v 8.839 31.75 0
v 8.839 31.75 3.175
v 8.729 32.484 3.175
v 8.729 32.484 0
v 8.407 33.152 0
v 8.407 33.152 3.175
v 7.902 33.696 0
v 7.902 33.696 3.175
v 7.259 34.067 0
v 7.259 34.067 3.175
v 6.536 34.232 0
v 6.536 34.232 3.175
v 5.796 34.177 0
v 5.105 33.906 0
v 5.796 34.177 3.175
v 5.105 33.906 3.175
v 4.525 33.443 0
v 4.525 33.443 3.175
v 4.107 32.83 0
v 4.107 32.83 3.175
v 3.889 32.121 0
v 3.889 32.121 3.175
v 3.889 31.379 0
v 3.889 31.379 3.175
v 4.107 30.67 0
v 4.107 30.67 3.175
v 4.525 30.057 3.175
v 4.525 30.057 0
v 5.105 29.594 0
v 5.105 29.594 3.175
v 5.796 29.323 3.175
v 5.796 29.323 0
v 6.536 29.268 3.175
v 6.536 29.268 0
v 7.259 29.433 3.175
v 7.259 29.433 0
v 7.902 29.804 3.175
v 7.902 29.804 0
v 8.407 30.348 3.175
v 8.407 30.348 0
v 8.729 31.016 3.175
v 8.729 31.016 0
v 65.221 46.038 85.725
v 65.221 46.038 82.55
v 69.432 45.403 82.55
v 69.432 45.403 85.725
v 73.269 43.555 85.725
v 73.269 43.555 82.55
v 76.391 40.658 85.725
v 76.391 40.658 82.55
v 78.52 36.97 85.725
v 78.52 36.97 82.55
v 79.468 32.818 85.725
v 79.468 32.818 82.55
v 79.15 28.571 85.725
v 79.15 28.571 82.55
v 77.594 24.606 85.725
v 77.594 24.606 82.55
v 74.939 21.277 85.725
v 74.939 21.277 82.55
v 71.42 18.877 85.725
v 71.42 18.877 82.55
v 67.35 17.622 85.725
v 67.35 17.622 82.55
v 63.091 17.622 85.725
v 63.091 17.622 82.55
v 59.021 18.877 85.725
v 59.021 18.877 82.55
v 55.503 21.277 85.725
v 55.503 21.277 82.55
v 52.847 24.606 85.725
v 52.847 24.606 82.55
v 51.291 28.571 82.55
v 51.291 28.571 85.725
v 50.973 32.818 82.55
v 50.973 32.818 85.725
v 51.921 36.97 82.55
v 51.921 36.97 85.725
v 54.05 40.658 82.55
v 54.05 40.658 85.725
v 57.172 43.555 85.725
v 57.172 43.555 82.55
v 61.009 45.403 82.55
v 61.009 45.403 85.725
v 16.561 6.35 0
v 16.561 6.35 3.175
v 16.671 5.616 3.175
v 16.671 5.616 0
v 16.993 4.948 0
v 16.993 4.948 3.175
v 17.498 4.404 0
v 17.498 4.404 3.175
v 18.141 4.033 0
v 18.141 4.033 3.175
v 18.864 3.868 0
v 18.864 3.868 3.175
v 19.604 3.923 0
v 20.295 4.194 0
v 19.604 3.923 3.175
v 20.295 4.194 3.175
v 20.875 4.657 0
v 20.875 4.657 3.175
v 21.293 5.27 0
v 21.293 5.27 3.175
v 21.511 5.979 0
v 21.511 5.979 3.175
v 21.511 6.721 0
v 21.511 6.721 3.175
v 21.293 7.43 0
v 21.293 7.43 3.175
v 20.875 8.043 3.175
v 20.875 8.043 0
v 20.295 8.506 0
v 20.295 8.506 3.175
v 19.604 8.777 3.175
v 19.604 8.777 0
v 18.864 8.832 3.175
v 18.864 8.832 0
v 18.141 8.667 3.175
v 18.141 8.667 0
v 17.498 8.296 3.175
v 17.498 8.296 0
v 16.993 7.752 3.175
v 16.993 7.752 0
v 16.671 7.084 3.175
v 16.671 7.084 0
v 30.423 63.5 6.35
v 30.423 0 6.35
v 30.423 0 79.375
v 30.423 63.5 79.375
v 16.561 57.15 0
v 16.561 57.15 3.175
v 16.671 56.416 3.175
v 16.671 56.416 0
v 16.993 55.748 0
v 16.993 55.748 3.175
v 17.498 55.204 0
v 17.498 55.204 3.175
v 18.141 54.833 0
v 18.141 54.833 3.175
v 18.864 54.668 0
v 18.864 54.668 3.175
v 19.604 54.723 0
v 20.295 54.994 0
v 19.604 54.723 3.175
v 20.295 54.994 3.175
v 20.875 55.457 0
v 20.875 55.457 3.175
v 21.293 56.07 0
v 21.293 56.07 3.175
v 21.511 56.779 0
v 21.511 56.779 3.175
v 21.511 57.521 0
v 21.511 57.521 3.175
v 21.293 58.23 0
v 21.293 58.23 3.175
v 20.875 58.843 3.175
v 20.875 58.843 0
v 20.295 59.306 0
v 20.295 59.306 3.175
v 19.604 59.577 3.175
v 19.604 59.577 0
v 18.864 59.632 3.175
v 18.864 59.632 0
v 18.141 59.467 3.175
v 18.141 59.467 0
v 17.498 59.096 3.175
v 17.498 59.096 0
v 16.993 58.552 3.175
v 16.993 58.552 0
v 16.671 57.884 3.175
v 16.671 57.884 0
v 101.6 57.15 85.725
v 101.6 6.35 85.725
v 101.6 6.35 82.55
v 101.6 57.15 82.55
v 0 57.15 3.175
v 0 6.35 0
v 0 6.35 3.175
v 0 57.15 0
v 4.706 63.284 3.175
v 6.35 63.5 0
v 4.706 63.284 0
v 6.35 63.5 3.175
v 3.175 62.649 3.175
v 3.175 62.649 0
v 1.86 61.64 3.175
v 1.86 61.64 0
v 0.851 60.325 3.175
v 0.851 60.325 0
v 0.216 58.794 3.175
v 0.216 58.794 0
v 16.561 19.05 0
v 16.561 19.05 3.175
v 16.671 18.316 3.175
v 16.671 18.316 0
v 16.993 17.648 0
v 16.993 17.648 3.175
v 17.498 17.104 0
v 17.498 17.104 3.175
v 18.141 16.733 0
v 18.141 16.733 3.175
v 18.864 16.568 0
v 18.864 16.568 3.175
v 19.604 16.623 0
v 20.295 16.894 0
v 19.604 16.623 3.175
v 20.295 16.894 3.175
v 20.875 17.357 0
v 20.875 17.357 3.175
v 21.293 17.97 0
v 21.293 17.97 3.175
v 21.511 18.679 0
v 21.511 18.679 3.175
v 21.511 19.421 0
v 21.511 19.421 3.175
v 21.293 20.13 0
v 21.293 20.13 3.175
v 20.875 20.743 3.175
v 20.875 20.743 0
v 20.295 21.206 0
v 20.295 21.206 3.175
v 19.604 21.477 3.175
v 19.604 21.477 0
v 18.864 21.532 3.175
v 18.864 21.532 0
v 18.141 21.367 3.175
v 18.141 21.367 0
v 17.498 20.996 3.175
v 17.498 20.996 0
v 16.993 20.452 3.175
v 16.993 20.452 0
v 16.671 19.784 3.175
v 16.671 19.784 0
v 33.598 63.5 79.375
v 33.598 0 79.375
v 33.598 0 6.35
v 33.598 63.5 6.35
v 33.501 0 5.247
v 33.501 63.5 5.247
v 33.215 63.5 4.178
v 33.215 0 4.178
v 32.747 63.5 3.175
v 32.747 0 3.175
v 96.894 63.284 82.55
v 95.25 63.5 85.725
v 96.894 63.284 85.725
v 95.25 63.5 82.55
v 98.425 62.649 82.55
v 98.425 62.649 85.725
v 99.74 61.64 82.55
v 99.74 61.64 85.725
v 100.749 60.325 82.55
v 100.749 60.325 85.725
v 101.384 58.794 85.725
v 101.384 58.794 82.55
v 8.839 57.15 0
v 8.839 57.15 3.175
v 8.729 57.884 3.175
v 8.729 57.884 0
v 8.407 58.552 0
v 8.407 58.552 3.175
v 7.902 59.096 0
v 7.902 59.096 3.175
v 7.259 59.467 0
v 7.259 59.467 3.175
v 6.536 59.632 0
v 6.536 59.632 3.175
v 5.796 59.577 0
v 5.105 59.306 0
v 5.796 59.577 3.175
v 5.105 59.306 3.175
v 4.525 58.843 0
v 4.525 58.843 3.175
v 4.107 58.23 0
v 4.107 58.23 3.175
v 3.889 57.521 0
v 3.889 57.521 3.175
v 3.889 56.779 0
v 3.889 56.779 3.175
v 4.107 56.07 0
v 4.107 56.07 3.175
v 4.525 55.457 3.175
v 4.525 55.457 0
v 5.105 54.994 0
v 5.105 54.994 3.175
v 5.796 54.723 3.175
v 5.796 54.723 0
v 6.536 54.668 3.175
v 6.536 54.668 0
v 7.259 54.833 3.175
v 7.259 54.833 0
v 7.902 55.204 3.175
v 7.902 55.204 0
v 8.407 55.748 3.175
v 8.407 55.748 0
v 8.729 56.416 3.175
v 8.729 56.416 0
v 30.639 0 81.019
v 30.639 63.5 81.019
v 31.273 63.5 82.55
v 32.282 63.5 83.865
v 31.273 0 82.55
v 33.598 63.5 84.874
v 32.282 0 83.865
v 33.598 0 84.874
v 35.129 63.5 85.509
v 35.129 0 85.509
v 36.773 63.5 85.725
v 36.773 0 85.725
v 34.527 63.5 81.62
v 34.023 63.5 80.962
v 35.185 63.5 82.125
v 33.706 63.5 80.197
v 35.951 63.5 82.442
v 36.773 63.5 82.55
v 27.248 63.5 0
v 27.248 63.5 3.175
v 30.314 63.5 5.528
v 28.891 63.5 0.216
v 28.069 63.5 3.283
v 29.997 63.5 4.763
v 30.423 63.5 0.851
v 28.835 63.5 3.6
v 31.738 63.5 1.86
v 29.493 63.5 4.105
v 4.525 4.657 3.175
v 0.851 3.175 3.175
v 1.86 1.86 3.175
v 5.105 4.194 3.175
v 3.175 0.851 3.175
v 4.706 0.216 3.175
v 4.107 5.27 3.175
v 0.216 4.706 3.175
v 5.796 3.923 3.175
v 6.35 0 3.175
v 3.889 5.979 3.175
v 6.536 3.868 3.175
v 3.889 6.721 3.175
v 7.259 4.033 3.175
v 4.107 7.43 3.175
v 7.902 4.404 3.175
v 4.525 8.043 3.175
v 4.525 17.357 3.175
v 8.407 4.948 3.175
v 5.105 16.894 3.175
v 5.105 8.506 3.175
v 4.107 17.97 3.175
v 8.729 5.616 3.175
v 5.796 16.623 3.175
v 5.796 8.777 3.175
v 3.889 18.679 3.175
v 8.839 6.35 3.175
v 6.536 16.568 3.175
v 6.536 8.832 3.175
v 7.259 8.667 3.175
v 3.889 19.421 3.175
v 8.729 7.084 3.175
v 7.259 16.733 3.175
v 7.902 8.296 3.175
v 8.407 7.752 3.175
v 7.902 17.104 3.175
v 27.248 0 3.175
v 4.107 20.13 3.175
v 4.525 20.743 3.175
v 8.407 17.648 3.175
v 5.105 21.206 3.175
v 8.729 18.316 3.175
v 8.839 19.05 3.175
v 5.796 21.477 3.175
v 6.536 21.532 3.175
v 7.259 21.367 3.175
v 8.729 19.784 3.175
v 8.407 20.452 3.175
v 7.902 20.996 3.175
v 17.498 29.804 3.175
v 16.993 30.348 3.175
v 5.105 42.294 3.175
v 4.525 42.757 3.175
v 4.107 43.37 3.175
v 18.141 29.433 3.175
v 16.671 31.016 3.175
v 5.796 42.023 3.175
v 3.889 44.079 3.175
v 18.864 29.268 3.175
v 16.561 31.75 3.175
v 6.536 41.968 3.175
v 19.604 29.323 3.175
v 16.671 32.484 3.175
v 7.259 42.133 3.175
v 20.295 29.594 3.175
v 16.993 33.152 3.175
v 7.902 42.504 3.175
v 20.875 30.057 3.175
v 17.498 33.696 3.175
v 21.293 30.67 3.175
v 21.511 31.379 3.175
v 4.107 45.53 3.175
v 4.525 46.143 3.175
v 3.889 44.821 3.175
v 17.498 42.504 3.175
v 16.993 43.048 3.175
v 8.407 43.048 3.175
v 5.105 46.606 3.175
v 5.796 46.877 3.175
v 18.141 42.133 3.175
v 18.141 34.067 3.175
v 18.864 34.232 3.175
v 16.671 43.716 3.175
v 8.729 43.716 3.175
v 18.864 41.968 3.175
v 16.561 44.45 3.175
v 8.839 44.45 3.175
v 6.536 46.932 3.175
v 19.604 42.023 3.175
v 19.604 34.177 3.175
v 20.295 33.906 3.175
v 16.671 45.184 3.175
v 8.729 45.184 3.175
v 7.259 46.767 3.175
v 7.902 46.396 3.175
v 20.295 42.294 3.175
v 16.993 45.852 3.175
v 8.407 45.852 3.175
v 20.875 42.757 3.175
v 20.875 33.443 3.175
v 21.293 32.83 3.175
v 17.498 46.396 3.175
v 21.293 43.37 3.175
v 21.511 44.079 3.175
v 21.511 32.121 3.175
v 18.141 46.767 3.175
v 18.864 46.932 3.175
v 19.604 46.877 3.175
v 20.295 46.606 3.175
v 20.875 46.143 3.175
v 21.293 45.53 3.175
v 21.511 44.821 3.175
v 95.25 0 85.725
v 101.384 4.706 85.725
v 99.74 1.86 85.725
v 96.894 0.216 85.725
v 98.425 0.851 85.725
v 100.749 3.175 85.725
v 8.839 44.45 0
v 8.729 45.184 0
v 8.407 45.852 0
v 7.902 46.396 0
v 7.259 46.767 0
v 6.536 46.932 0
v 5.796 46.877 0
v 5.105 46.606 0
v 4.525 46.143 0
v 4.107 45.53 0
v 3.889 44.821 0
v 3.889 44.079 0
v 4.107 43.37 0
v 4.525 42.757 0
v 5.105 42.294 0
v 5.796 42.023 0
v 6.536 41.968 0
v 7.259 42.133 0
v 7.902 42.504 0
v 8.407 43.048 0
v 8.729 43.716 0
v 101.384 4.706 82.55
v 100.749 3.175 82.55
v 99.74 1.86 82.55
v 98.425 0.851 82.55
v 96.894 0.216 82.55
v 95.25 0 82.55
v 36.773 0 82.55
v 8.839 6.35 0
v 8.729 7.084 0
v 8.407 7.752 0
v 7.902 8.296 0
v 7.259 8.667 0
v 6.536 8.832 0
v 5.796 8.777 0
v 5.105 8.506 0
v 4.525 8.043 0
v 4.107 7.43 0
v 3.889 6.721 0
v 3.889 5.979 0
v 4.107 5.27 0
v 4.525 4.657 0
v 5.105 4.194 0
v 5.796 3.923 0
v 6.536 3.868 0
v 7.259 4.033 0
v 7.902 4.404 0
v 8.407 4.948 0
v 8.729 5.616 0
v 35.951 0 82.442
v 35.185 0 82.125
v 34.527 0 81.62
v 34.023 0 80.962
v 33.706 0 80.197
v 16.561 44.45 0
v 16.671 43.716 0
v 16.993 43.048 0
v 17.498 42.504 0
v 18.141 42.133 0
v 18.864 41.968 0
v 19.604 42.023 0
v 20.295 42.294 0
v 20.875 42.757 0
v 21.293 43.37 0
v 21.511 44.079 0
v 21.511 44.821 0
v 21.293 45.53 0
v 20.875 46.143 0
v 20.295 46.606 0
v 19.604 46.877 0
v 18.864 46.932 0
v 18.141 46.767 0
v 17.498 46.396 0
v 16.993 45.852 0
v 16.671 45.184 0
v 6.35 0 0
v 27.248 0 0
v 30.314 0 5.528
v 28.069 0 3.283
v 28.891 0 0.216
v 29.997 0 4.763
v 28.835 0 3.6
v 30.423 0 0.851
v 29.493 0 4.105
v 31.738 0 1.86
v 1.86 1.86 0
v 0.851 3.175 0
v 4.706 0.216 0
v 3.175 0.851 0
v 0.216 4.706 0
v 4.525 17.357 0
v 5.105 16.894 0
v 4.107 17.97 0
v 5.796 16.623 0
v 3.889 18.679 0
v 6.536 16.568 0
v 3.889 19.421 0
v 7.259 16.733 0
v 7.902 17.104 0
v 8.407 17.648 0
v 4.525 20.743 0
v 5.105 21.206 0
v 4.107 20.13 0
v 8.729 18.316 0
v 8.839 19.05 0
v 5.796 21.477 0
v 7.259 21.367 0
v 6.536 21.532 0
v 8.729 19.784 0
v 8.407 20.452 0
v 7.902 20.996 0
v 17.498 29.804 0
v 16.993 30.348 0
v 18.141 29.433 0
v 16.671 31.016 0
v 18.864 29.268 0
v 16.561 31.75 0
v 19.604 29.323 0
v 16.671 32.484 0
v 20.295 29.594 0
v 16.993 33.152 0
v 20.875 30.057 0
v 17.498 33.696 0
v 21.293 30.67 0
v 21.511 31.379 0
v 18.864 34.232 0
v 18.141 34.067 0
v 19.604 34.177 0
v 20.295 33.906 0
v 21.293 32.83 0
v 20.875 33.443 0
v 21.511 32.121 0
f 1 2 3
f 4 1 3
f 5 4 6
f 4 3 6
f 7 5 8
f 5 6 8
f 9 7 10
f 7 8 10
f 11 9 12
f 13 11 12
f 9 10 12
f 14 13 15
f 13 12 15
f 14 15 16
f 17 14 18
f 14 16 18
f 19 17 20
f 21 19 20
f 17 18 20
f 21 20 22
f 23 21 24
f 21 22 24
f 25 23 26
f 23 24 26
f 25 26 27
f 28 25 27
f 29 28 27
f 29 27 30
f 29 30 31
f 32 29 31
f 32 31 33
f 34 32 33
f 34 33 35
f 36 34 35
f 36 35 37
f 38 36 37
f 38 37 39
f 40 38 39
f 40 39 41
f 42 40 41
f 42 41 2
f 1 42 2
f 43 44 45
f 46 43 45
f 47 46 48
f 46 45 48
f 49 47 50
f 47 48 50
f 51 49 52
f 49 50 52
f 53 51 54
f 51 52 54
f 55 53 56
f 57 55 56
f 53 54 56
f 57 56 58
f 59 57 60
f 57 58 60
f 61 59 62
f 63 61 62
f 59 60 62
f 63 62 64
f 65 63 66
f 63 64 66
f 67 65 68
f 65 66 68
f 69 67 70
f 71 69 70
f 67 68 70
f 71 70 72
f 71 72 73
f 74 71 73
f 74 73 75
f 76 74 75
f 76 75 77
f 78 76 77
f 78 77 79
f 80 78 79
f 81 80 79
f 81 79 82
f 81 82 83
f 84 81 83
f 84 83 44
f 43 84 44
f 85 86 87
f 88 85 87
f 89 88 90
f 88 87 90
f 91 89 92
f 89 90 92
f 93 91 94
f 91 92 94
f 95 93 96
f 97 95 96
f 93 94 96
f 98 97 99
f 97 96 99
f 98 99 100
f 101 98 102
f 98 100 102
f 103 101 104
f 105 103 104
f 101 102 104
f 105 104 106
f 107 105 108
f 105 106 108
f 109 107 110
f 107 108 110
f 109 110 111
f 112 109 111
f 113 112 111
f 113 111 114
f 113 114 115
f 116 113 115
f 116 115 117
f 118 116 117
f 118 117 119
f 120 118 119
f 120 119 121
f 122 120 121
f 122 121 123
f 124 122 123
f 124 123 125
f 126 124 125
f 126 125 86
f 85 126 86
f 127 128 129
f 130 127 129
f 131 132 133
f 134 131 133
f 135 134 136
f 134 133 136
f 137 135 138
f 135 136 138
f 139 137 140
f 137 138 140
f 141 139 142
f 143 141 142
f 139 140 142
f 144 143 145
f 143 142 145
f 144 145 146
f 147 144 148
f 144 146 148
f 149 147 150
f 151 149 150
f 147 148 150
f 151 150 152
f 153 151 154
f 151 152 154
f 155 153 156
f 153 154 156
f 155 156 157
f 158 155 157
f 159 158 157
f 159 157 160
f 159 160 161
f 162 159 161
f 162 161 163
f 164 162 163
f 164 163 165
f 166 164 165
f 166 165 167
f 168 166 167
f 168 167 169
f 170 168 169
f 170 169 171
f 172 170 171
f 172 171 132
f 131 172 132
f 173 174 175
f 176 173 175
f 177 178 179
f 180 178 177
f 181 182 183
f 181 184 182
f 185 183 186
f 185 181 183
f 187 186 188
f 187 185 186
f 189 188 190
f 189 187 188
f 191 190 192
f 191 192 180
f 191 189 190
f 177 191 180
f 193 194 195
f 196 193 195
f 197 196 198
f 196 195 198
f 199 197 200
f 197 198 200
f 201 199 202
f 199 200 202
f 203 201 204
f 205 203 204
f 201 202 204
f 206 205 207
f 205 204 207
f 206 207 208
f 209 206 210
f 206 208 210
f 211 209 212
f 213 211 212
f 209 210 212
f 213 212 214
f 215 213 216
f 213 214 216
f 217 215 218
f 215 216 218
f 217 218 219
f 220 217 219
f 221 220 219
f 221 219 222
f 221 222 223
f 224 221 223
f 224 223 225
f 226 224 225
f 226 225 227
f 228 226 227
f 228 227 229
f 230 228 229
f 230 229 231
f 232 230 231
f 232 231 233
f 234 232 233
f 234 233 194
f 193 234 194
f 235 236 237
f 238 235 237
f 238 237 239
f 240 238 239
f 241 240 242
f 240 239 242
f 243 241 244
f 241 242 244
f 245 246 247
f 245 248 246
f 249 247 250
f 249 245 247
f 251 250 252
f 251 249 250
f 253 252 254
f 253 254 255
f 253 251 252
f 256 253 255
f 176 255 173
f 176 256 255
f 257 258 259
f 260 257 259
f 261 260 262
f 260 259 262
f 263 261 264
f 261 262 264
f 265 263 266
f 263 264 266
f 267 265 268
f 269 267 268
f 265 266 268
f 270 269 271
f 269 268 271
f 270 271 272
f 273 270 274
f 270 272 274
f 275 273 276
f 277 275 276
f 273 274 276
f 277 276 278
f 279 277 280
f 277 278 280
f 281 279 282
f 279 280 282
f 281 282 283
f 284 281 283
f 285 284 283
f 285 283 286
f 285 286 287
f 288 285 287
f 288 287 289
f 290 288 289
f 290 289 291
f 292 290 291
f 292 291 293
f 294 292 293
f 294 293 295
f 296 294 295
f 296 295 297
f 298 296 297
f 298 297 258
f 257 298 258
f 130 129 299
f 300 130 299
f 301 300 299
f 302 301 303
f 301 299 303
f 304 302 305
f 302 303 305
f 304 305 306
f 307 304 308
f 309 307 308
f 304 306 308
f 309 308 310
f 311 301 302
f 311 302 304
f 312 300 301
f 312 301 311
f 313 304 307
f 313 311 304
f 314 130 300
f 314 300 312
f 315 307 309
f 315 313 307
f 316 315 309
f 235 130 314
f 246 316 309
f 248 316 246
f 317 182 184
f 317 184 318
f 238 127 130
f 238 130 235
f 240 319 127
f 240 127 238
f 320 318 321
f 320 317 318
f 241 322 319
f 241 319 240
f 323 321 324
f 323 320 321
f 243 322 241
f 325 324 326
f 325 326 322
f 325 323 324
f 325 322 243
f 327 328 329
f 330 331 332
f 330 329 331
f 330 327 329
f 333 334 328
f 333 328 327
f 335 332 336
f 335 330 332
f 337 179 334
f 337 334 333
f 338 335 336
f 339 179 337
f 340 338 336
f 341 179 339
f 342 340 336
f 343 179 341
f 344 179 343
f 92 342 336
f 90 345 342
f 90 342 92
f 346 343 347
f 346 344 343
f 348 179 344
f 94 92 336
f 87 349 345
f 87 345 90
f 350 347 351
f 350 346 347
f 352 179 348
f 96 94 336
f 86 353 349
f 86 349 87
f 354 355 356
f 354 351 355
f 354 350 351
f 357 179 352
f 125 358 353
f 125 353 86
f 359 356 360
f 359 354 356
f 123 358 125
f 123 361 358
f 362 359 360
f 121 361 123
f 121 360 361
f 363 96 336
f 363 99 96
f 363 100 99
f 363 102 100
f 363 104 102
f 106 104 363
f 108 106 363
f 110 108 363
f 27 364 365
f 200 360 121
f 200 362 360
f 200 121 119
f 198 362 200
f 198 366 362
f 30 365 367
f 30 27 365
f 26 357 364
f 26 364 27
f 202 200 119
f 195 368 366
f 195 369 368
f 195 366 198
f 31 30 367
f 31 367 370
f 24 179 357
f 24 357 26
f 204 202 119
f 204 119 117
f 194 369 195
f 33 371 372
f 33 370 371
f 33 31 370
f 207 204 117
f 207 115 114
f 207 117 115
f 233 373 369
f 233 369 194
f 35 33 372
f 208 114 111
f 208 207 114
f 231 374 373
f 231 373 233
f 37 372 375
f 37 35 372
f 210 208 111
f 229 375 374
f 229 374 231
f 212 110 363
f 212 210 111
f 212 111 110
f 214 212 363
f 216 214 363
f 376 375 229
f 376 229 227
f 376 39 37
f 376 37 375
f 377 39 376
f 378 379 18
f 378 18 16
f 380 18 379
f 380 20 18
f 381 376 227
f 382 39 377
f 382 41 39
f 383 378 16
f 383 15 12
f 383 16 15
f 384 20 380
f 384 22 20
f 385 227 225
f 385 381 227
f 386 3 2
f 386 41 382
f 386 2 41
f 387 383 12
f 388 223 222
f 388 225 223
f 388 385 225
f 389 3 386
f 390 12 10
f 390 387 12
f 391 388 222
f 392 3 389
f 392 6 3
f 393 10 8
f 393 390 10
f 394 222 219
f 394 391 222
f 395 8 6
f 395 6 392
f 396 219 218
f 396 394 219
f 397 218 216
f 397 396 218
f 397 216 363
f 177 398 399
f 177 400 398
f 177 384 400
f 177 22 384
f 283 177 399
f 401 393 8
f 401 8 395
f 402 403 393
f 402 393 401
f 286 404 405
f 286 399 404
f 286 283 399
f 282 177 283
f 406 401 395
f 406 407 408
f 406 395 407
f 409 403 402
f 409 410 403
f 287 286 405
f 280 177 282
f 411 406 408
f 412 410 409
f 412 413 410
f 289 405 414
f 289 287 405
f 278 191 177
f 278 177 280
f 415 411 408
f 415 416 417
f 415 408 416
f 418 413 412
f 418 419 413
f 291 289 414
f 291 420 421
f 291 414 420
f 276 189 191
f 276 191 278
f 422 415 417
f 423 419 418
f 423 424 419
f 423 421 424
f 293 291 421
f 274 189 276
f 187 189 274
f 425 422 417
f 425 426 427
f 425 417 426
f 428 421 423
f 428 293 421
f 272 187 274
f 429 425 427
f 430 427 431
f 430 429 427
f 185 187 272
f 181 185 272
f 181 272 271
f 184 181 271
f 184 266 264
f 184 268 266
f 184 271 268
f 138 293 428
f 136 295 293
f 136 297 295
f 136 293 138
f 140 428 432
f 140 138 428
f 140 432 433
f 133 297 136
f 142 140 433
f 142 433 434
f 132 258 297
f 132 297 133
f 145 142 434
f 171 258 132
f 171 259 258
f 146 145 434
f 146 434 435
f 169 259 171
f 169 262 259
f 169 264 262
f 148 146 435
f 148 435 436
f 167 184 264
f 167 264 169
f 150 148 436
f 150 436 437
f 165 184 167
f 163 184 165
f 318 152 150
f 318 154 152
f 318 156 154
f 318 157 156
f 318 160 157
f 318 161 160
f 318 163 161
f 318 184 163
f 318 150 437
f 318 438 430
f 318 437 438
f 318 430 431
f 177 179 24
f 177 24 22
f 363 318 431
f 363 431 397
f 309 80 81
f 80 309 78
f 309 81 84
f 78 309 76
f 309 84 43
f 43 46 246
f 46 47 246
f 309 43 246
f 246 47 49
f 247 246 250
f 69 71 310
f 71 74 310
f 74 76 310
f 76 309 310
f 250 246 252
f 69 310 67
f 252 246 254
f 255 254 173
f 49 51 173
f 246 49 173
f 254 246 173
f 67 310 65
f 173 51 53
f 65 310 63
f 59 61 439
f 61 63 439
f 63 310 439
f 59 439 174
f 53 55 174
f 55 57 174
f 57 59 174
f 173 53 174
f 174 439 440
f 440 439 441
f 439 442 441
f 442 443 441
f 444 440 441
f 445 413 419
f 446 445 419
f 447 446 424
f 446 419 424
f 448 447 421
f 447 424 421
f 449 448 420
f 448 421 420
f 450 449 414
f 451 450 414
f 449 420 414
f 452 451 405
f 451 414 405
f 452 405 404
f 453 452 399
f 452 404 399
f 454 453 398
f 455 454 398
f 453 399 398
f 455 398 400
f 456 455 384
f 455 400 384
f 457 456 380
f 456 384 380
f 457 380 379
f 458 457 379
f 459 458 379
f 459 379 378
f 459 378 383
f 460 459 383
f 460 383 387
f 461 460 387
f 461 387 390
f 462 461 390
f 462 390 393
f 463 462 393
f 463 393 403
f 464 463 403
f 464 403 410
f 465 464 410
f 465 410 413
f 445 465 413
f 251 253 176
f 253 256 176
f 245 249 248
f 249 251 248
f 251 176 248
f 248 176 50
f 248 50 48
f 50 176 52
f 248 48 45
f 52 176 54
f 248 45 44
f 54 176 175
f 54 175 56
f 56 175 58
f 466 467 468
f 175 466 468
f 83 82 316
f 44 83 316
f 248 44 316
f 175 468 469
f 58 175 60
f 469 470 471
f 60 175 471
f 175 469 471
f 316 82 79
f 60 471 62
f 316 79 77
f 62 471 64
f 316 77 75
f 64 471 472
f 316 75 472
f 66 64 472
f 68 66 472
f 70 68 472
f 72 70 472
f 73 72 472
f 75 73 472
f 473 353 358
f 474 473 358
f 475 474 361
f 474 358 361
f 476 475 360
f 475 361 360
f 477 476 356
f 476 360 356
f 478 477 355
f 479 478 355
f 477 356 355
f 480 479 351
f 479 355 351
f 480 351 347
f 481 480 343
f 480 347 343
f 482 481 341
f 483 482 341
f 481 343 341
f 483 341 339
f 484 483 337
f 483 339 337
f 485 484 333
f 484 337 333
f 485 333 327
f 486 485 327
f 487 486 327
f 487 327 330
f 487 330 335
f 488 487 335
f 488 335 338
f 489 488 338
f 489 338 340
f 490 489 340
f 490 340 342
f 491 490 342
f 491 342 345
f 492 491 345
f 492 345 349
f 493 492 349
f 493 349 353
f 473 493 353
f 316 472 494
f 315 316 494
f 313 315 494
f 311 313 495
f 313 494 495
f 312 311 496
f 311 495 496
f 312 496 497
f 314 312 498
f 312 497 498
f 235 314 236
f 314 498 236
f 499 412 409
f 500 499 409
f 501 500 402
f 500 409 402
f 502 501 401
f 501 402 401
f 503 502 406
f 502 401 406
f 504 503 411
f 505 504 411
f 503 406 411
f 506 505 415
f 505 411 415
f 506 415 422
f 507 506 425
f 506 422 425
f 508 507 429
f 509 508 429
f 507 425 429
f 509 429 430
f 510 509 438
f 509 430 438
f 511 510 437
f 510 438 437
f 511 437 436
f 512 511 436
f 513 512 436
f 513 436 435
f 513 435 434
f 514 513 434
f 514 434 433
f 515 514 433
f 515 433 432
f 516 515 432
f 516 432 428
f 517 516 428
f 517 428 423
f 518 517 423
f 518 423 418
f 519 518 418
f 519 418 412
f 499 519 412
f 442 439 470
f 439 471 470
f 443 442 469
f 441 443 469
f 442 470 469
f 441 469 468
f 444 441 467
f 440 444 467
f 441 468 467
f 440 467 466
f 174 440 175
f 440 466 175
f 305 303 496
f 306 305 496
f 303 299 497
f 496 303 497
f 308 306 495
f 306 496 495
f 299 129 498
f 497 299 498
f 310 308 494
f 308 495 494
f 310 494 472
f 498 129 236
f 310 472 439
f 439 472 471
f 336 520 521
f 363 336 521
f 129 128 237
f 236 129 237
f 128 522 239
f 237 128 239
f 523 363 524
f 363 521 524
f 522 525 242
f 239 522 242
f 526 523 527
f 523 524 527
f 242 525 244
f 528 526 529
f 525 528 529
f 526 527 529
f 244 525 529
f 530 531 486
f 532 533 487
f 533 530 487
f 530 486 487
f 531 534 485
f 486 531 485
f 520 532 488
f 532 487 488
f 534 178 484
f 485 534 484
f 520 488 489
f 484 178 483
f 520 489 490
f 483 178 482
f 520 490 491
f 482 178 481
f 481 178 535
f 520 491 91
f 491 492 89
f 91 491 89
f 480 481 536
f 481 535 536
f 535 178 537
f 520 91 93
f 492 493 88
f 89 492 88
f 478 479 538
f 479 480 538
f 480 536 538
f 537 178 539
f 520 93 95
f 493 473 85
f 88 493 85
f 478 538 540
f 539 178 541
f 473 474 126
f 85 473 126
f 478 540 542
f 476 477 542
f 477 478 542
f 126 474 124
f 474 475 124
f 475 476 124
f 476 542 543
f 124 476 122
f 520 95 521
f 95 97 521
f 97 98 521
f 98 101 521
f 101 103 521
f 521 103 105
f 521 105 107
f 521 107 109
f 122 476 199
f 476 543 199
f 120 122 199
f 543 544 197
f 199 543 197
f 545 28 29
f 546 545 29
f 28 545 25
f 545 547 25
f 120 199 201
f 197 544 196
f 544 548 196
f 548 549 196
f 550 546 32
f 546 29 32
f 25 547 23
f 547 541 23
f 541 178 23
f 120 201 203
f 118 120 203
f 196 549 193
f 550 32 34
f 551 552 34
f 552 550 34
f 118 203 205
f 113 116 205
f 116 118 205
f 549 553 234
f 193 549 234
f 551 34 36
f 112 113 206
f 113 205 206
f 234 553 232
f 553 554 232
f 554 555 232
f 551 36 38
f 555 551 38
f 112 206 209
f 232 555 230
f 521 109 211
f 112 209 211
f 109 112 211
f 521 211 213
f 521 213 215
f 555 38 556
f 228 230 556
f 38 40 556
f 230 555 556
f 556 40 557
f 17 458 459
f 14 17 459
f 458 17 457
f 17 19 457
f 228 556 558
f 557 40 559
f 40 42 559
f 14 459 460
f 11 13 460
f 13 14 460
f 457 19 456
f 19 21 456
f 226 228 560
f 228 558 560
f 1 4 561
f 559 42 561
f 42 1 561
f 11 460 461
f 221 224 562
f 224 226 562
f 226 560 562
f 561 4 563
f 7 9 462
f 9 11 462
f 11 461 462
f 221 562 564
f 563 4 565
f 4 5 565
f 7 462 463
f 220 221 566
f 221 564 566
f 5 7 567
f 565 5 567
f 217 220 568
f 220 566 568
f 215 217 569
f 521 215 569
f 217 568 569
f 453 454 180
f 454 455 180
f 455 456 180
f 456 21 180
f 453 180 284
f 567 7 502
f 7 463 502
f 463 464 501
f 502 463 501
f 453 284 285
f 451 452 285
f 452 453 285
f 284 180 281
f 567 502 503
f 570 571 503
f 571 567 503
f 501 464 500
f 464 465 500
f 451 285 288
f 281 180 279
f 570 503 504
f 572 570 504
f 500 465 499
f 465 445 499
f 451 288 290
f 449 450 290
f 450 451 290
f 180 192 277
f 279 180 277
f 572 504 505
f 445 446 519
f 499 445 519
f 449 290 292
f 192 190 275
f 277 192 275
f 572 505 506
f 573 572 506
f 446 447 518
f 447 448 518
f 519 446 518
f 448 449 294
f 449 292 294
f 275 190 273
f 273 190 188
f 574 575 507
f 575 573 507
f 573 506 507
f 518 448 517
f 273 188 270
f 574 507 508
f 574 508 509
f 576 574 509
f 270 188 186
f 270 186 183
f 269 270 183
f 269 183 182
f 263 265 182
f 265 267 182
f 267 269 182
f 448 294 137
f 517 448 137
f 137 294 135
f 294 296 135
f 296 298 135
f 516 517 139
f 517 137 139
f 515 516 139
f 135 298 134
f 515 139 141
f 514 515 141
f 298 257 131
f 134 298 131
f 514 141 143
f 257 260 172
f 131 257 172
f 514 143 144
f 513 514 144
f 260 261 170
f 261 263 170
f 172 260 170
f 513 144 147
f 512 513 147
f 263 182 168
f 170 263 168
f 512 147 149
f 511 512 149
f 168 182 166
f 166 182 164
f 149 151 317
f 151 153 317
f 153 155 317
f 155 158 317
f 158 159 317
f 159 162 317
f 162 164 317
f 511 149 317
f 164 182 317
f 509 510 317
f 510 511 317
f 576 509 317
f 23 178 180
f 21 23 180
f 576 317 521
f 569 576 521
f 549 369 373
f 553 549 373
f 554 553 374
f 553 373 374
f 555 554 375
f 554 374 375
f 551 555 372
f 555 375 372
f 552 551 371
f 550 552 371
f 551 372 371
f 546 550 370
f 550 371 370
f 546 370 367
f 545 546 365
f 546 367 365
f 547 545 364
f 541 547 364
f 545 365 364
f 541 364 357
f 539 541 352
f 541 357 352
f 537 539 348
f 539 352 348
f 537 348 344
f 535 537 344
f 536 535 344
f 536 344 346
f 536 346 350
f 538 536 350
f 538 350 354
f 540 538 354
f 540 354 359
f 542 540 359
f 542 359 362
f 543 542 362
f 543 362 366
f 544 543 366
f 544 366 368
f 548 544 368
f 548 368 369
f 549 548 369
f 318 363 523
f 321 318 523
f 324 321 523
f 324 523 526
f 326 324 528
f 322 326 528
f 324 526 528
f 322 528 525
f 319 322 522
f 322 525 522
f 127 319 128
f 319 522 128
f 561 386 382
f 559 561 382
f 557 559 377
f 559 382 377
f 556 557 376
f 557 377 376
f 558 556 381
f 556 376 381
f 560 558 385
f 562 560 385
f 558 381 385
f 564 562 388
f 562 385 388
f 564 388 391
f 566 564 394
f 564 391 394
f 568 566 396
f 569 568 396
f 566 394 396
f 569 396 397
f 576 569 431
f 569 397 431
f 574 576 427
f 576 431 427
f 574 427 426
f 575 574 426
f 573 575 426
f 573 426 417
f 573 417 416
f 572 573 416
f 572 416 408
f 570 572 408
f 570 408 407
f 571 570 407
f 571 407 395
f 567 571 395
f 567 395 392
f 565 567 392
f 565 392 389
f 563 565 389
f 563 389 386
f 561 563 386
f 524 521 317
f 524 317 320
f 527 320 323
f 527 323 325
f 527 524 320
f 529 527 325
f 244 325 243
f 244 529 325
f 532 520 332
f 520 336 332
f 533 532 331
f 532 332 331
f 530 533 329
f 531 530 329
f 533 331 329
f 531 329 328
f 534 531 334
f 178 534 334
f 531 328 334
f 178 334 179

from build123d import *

# Parameters (mm, degrees)
SKETCH1_W           = 101.6
SKETCH1_H           = 63.5
BOSS_EXTRUDE1_DEPTH = 3.175
JOG1_DEPTH          = 63.5
JOG1_2_DEPTH        = 63.5
SKETCH7_R           = 14.2875
CUT_EXTRUDE1_DEPTH  = 146.496778315
SKETCH9_R           = 2.4892
CUT_EXTRUDE2_DEPTH  = 146.496778315
FILLET1_R           = 6.35


# Read off the part's stored shape, not the designer's step: Jog1
with BuildPart() as part:
    # Sketch1 → Boss-Extrude1 (new body)
    with BuildSketch(Plane.XY):
        with Locations((50.8, 31.75)):
            Rectangle(SKETCH1_W, SKETCH1_H)
    extrude(amount=BOSS_EXTRUDE1_DEPTH)

    # Jog1 outline → Jog1 (cut)
    with BuildSketch(Plane(origin=(0, 0, 0), x_dir=(1, 0, 0), z_dir=(0, 1, 0))):
        with BuildLine():
            ThreePointArc((27.247541247, 0), (30.422541247, -0.850738686), (32.746802561, -3.175))
            Line((32.746802561, -3.175), (101.6, -3.175))
            Line((101.6, -3.175), (101.6, 0))
            Line((101.6, 0), (27.247541247, 0))
        make_face()
    extrude(amount=JOG1_DEPTH, mode=Mode.SUBTRACT)

    # Jog1 2 outline → Jog1 2 (add)
    with BuildSketch(Plane(origin=(0, 0, 0), x_dir=(1, 0, 0), z_dir=(0, 1, 0))):
        with BuildLine():
            ThreePointArc((36.772541247, -82.55), (34.527477217, -81.62006403), (33.597541247, -79.375))
            Line((33.597541247, -79.375), (33.597541247, -6.35))
            ThreePointArc((33.597541247, -6.35), (33.381170244, -4.706499064), (32.746802561, -3.175))
            Line((32.746802561, -3.175), (27.247541247, -3.175))
            ThreePointArc((27.247541247, -3.175), (29.492605277, -4.10493597), (30.422541247, -6.35))
            Line((30.422541247, -6.35), (30.422541247, -79.375))
            ThreePointArc((30.422541247, -79.375), (32.282413186, -83.865128061), (36.772541247, -85.725))
            Line((36.772541247, -85.725), (101.6, -85.725))
            Line((101.6, -85.725), (101.6, -82.55))
            Line((101.6, -82.55), (36.772541247, -82.55))
        make_face()
    extrude(amount=JOG1_2_DEPTH)

    # Sketch7 → Cut-Extrude1 (cut, through all)
    with BuildSketch(Plane(origin=(0, 0, 82.55), x_dir=(-1, 0, 0), z_dir=(0, 0, -1))):
        with Locations(Location((-65.220541247, 31.75, 0), (0, 0, 90))):
            Circle(SKETCH7_R)
    extrude(amount=-CUT_EXTRUDE1_DEPTH, mode=Mode.SUBTRACT)

    # Sketch9 → Cut-Extrude2 (cut, through all)
    with BuildSketch(Plane.XY.offset(3.175)):
        with Locations((6.35, 57.15)):
            Circle(SKETCH9_R)
        with Locations(Location((19.05, 57.15, 0), (0, 0, 180))):
            Circle(SKETCH9_R)
        with Locations((6.35, 44.45)):
            Circle(SKETCH9_R)
        with Locations(Location((19.05, 44.45, 0), (0, 0, 180))):
            Circle(SKETCH9_R)
        with Locations((6.35, 31.75)):
            Circle(SKETCH9_R)
        with Locations(Location((19.05, 31.75, 0), (0, 0, 180))):
            Circle(SKETCH9_R)
        with Locations((6.35, 19.05)):
            Circle(SKETCH9_R)
        with Locations(Location((19.05, 19.05, 0), (0, 0, 180))):
            Circle(SKETCH9_R)
        with Locations((6.35, 6.35)):
            Circle(SKETCH9_R)
        with Locations(Location((19.05, 6.35, 0), (0, 0, 180))):
            Circle(SKETCH9_R)
    extrude(amount=-CUT_EXTRUDE2_DEPTH, mode=Mode.SUBTRACT)

    # Fillet1
    fillet1_edges = [part.edges().sort_by_distance(p)[0] for p in [
        (101.6, 63.5, 84.1375),
        (101.6, 0, 84.1375),
        (0, 0, 1.5875),
        (0, 63.5, 1.5875),
    ]]
    fillet(fillet1_edges, radius=FILLET1_R)


solid = part.part
